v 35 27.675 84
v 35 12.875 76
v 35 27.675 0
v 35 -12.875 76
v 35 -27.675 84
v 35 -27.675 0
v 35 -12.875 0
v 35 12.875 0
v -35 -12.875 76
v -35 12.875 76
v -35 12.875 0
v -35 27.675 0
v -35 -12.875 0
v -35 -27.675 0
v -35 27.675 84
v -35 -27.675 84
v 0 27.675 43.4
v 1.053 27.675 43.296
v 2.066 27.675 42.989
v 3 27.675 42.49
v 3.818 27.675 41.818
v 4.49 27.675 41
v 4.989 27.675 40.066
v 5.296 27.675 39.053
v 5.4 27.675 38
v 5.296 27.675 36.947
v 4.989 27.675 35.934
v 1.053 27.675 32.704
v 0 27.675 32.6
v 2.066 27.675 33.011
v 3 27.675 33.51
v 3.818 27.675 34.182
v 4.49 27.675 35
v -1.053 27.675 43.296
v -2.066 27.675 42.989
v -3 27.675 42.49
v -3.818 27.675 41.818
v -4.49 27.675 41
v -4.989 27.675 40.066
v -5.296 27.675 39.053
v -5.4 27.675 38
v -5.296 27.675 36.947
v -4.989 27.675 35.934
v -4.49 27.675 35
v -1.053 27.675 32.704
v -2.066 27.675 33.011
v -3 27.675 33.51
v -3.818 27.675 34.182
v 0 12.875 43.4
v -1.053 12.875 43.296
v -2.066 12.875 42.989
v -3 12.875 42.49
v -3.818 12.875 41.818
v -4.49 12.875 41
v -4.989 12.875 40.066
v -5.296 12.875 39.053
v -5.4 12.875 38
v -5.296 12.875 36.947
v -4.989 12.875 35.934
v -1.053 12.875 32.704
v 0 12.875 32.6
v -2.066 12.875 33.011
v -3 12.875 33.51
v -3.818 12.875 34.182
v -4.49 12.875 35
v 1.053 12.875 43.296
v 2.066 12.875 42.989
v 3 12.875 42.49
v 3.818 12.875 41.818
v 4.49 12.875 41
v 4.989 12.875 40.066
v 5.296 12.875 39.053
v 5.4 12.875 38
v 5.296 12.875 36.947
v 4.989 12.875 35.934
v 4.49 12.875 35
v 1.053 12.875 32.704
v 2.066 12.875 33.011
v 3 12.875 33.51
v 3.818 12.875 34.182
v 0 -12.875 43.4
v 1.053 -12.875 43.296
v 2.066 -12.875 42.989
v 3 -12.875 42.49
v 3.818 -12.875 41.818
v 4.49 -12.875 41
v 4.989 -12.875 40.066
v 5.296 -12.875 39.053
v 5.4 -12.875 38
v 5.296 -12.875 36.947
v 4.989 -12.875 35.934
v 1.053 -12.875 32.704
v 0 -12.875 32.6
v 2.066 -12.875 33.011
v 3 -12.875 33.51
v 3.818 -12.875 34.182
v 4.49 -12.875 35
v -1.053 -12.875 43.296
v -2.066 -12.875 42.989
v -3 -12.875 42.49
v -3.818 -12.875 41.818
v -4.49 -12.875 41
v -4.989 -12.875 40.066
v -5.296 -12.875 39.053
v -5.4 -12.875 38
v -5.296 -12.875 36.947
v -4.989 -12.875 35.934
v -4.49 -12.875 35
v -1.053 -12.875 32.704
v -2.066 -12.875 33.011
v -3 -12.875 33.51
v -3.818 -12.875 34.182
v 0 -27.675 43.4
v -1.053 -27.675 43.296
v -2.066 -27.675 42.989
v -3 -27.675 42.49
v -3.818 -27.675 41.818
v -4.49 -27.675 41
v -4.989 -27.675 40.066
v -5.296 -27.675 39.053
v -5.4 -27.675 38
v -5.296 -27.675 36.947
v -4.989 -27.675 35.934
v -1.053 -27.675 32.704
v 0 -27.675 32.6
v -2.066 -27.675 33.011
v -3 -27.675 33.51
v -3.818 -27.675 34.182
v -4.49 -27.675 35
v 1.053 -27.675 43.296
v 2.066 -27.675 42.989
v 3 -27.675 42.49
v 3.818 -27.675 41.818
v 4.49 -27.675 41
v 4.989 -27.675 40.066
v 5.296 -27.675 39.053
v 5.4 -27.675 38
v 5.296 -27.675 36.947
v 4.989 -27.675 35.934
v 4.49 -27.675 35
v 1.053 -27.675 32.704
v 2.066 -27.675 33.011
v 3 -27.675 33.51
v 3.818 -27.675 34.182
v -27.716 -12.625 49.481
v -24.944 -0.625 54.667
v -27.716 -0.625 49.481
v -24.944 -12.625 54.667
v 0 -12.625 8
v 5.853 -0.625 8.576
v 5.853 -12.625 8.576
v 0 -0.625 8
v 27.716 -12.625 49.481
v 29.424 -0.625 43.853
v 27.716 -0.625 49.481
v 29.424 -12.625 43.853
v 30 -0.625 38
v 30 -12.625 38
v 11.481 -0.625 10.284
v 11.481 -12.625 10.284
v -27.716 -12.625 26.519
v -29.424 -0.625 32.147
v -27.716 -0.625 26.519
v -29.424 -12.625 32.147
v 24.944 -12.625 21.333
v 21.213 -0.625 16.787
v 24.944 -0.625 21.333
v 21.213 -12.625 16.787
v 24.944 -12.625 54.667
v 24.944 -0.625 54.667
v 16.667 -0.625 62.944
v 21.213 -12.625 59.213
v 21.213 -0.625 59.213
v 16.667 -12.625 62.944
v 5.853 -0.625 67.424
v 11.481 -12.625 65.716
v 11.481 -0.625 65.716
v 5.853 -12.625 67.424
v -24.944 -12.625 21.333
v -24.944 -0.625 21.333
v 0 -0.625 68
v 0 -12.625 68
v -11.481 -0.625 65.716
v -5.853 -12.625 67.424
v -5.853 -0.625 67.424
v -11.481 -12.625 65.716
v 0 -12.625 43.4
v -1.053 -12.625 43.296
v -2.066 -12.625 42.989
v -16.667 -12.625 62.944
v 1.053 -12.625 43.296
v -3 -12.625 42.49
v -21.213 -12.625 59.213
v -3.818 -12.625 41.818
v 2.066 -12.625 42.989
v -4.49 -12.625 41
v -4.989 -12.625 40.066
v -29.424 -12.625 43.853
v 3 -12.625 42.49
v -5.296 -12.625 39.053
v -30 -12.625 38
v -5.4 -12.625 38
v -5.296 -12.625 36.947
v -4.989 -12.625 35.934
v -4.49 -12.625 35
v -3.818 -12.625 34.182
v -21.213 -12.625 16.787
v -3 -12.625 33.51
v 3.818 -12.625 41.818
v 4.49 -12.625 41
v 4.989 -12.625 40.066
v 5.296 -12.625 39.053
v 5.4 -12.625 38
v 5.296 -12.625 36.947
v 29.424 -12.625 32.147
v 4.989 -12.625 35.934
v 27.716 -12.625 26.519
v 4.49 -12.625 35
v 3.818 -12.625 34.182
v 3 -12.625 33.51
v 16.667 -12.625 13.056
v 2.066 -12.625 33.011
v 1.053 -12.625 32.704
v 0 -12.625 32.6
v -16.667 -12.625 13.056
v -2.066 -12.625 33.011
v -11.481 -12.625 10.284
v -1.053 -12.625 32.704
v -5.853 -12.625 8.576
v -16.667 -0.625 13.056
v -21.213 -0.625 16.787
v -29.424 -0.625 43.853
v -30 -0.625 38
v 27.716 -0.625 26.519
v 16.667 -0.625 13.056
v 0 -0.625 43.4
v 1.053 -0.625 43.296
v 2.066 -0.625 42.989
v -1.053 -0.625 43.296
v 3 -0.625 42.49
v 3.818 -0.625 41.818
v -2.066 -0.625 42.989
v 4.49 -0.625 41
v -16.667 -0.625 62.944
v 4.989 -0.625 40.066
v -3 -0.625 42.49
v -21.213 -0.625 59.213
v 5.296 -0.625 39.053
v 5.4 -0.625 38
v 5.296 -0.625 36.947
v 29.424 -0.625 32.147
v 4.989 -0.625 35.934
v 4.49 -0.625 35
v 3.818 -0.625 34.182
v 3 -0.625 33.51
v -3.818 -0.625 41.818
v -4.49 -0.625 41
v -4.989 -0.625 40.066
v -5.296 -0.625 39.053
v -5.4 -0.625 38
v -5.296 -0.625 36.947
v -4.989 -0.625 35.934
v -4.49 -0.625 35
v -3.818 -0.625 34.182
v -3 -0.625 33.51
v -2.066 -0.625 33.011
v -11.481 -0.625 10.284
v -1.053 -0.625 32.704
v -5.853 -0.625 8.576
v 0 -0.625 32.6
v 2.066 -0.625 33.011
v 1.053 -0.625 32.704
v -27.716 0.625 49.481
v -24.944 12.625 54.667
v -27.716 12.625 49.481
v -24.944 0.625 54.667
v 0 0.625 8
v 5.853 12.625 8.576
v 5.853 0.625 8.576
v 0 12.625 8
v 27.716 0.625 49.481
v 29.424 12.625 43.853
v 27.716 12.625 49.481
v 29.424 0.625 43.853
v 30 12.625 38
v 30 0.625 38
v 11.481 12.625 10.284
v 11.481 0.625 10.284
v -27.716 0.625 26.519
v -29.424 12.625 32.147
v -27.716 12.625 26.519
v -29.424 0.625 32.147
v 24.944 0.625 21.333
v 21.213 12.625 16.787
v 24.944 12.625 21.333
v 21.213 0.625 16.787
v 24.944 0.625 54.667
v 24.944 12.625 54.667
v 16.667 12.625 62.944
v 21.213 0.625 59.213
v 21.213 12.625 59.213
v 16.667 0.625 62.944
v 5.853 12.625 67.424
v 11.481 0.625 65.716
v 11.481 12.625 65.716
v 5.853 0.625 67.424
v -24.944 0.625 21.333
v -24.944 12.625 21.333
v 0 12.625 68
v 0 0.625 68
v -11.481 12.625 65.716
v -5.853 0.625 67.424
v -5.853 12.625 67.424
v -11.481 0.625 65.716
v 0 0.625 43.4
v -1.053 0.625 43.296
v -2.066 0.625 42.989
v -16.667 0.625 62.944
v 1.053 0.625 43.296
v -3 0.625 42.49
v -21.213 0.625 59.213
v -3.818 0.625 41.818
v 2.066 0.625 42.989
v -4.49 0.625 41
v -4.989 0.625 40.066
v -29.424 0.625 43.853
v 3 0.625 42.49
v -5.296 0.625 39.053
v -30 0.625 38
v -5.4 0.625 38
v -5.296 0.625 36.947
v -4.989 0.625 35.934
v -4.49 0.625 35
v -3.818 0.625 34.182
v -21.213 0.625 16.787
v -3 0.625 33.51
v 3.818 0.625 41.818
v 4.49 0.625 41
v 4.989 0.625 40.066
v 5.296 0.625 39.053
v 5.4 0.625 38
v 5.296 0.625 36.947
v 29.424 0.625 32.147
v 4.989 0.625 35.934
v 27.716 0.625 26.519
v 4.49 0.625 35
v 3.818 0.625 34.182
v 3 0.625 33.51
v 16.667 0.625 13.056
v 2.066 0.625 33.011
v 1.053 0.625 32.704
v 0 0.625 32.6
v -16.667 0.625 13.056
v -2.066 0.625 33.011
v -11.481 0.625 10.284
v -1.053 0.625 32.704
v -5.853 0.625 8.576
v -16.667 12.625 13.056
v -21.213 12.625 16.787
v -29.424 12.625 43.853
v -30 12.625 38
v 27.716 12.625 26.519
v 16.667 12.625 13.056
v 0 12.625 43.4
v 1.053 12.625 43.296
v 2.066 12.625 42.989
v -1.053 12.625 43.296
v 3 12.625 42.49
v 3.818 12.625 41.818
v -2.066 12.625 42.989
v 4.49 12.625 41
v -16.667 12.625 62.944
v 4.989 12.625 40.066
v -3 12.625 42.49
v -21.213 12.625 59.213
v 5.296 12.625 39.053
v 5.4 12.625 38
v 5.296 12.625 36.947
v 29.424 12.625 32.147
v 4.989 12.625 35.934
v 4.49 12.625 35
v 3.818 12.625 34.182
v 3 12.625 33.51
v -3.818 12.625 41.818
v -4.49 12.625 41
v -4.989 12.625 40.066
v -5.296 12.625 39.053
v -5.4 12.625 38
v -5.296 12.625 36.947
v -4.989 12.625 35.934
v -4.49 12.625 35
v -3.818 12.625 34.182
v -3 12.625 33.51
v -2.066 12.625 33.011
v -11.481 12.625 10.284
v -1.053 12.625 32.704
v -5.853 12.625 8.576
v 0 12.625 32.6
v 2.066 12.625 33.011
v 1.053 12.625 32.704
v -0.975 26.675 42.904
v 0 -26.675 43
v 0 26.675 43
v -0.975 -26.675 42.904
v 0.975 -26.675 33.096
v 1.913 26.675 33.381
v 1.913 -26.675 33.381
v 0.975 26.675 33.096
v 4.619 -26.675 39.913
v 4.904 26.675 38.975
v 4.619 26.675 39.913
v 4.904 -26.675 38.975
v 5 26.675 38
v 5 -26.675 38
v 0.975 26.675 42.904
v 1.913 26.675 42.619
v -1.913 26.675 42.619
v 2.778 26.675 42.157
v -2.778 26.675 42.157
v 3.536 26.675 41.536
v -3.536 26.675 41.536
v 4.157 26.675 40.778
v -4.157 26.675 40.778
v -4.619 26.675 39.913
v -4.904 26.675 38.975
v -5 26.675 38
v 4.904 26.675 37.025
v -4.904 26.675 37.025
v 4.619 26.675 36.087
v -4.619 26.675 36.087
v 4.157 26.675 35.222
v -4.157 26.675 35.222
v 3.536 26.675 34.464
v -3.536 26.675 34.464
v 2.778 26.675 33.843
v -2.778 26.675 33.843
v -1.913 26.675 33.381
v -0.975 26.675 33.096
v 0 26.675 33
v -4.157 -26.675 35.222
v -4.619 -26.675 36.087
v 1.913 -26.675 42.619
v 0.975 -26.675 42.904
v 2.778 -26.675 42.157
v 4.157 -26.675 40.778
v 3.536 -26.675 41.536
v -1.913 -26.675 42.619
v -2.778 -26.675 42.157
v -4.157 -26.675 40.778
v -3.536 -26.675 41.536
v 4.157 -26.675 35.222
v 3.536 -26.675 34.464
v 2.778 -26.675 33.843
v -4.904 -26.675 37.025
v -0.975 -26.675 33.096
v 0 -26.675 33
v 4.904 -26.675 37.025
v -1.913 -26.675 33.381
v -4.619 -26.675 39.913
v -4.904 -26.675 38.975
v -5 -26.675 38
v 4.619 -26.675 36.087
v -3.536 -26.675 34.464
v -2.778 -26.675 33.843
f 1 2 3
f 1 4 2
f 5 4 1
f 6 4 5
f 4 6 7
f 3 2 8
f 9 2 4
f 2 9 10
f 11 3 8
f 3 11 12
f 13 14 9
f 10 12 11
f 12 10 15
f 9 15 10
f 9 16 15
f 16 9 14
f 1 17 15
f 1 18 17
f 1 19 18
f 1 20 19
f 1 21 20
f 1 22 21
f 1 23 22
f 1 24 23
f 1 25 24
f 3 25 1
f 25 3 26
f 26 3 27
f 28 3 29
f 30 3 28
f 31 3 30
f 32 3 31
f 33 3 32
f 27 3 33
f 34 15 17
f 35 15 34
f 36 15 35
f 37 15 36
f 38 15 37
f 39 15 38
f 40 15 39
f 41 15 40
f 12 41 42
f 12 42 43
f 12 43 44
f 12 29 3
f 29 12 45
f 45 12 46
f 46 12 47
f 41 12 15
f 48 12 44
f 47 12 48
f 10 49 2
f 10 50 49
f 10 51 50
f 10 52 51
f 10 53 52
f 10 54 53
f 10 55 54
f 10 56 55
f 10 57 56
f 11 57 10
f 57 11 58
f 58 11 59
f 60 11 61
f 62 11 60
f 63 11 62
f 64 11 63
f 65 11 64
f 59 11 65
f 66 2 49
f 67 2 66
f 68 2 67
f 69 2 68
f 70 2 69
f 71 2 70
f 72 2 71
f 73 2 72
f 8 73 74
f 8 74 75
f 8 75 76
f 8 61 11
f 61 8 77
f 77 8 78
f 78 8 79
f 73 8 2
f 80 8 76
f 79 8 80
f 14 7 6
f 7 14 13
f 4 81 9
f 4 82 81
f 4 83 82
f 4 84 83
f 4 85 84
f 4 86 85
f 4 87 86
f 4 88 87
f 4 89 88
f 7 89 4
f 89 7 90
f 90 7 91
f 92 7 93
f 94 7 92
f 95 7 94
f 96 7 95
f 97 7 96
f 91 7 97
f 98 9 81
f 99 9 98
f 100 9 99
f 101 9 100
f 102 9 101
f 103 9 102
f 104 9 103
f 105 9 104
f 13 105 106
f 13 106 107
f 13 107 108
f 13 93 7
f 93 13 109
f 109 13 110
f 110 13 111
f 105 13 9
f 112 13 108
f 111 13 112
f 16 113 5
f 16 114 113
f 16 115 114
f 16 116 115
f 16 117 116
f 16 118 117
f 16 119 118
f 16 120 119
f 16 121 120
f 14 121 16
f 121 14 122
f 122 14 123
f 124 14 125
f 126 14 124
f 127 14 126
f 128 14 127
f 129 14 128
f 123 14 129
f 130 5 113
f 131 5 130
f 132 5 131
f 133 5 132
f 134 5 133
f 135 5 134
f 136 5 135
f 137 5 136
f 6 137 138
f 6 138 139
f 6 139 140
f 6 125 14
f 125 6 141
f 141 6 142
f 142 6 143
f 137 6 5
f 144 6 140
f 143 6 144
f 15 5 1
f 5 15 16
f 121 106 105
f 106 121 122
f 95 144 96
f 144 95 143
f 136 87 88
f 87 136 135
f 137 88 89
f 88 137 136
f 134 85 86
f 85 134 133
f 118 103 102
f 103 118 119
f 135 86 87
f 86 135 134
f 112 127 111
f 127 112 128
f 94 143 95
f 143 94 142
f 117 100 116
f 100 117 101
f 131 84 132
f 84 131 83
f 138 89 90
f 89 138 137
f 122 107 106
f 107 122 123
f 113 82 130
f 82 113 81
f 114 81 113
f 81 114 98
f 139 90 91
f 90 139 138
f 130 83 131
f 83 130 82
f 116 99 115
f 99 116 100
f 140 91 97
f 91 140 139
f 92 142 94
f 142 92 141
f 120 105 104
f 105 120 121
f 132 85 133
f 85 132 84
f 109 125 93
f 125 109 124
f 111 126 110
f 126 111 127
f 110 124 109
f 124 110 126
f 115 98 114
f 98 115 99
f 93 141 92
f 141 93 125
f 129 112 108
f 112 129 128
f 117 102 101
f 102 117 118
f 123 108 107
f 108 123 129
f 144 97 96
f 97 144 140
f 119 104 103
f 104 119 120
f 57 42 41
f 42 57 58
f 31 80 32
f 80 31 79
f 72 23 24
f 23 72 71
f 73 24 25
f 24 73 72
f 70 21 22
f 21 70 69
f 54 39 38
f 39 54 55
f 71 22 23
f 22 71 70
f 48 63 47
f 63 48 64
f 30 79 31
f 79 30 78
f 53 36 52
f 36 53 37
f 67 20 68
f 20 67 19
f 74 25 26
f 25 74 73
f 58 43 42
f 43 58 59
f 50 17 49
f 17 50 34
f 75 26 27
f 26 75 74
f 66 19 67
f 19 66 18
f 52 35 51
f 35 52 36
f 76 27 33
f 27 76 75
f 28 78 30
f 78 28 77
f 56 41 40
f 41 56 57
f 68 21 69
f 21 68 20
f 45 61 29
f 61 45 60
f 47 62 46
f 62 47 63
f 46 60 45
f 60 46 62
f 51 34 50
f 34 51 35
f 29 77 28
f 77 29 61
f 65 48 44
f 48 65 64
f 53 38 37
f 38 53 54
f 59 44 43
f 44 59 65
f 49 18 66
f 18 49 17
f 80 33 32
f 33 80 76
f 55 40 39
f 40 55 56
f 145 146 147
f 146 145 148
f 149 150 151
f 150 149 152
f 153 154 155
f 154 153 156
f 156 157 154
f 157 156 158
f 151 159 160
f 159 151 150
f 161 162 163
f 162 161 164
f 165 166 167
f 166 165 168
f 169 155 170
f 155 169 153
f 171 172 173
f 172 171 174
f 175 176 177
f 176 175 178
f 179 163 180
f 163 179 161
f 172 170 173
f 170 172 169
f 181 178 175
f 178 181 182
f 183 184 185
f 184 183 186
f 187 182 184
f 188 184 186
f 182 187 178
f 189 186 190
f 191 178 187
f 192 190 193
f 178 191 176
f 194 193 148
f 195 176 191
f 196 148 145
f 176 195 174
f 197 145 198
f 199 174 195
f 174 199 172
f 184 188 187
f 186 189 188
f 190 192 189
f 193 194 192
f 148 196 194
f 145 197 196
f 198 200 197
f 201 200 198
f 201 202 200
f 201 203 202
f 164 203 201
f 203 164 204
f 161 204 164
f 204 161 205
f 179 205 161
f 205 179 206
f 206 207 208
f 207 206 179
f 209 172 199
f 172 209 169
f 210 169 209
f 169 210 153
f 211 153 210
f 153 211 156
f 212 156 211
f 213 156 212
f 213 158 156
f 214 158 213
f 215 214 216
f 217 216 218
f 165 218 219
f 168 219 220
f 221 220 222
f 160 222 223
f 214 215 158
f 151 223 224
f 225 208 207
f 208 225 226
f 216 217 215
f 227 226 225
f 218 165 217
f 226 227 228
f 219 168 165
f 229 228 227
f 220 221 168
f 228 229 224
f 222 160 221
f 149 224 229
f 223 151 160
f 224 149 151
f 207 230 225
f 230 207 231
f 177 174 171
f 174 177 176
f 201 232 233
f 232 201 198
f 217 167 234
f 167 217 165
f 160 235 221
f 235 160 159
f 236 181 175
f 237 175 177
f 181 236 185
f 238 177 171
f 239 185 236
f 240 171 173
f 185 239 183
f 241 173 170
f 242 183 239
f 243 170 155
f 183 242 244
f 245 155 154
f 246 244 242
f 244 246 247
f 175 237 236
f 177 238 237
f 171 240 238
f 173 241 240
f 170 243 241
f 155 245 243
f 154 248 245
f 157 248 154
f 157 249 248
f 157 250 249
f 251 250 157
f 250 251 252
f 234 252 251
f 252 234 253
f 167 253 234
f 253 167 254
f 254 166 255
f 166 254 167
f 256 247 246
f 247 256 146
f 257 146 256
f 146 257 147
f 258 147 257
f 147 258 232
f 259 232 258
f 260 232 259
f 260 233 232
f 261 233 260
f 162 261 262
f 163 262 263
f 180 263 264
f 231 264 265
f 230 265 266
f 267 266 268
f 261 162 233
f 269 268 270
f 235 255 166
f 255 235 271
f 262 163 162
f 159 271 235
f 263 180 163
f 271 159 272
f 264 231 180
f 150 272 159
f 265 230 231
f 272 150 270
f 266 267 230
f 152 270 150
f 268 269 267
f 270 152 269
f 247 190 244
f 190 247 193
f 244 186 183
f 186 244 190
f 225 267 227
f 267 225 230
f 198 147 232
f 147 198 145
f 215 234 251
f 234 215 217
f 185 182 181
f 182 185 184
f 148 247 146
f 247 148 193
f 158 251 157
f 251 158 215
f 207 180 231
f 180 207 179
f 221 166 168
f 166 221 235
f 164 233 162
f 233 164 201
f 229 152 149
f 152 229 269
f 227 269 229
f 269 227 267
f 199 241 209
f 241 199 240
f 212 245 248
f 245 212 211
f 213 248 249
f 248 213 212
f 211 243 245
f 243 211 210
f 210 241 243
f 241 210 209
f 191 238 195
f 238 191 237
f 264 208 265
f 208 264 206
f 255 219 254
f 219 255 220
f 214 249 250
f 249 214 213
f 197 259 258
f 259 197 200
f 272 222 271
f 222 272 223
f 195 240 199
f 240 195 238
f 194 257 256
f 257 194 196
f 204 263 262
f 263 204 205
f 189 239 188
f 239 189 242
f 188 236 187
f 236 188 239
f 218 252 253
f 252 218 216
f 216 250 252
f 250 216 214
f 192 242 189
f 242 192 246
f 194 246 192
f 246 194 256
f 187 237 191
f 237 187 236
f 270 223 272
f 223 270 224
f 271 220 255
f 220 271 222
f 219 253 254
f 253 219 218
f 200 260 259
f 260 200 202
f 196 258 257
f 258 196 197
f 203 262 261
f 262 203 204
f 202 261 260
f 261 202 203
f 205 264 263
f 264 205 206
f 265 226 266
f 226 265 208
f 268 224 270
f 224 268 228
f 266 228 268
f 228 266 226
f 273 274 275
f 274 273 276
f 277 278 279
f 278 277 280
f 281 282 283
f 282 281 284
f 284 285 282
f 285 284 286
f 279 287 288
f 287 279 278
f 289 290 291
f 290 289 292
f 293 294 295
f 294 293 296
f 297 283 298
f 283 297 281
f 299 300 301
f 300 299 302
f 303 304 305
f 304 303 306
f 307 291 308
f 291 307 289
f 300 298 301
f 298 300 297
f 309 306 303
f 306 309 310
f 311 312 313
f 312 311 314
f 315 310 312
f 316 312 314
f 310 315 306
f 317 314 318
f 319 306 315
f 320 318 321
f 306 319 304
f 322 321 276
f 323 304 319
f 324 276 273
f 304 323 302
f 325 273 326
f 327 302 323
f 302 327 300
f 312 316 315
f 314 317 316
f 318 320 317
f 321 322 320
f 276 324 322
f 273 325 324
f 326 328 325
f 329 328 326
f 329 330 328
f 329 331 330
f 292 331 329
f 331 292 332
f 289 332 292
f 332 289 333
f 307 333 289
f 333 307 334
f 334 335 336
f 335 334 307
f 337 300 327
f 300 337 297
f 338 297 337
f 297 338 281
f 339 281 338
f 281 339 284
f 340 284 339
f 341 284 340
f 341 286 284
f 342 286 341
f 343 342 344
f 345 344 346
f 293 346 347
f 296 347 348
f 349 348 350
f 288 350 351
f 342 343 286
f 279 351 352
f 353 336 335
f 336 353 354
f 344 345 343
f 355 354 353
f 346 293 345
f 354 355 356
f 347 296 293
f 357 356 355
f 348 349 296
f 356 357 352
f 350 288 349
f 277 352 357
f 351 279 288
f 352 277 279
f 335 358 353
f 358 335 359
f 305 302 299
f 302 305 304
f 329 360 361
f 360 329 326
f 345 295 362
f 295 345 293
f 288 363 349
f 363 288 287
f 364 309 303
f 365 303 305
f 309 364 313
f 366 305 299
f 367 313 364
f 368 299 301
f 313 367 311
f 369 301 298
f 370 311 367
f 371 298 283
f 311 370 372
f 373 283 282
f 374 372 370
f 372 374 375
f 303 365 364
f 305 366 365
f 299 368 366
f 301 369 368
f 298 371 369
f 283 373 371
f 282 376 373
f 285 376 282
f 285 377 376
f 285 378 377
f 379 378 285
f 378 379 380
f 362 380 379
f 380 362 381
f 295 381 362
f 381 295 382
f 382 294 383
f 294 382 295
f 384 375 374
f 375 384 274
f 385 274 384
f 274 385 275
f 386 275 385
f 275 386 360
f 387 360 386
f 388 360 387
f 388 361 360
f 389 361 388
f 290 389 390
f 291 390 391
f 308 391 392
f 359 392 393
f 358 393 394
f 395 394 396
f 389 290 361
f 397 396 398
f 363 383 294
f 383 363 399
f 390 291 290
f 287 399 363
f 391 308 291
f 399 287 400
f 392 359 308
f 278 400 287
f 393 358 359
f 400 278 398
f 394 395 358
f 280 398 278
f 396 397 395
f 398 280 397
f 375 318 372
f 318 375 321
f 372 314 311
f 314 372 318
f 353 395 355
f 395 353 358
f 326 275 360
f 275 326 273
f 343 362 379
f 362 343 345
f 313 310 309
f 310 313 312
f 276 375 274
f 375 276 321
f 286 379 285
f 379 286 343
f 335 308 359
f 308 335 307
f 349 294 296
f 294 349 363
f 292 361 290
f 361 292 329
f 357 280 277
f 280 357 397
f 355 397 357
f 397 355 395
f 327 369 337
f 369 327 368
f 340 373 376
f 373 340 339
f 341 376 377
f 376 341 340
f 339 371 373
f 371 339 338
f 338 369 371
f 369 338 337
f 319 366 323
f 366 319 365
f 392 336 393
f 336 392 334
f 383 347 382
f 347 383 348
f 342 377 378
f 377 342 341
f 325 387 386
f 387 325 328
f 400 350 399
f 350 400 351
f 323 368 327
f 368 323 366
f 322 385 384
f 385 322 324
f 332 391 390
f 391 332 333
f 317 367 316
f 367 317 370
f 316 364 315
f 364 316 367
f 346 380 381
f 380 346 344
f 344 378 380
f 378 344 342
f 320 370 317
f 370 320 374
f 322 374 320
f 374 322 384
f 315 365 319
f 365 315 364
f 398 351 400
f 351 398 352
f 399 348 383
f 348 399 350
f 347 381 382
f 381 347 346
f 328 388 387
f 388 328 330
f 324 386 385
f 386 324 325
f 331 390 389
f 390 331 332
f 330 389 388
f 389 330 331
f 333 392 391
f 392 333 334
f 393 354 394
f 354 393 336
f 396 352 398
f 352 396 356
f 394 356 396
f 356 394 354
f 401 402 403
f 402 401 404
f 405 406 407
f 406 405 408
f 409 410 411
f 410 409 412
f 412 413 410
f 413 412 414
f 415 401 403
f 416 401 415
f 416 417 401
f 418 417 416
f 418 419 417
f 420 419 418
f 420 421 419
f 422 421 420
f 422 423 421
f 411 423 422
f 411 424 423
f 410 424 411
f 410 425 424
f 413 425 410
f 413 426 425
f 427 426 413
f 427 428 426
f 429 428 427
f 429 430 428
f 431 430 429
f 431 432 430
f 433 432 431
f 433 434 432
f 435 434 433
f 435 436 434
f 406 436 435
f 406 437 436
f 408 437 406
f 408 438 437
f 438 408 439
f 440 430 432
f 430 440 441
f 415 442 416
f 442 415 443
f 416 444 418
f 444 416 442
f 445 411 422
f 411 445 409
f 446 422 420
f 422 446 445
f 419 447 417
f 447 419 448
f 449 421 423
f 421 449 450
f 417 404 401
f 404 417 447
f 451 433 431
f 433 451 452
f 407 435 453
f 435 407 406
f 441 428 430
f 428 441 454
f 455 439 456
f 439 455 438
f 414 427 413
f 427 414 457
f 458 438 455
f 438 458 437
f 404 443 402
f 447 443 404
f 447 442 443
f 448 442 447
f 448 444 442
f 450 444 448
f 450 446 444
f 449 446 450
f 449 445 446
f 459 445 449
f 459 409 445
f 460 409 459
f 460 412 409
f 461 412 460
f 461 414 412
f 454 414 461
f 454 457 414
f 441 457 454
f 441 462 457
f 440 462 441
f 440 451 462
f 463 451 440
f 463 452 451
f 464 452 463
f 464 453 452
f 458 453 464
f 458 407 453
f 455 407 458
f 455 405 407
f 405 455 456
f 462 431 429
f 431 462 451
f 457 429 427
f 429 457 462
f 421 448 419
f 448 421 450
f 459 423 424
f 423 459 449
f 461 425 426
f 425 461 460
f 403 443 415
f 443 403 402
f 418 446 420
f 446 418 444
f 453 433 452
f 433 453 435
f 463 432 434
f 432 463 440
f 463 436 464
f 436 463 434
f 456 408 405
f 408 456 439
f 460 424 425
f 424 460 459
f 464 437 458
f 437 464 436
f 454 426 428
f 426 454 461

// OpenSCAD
$fn = 32;

// ------------------------------------------------------------------------
// Trolley wheel set: wheels d60, fork 76 mm tall
// Every part is its own module, assembly() places every instance.
// ------------------------------------------------------------------------

// --- part 1 ---
module trolley_fork() {
  difference() {
    union() {
      translate([-35, 12.875, 0]) cube([70, 14.8, 76]);
      translate([-35, -27.675, 0]) cube([70, 14.8, 76]);
      translate([-35, -27.675, 76]) cube([70, 55.35, 8]);
    }
    translate([0, -20.275, 38]) rotate([90, 0, 0]) cylinder(h = 16.8, d = 10.8, center = true);
    translate([0, 20.275, 38]) rotate([90, 0, 0]) cylinder(h = 16.8, d = 10.8, center = true);
  }
}

// --- part 2 ---
module trolley_wheel() {
  difference() {
      translate([0, 0, 0]) cylinder(h = 12, d = 60);
      translate([0, 0, -1]) cylinder(h = 14, d = 10.8);
    }
}

// --- part 3 ---
module trolley_axle() {
  translate([0, 0, -26.675]) cylinder(h = 53.35, d = 10);
}

// --- assembly ---
module assembly() {
  color([0.80, 0.24, 0.20]) translate([0, 0, 0]) rotate([0, 0, 0]) trolley_fork();
  color([0.20, 0.45, 0.75]) translate([0, -0.625, 38]) rotate([90, 0, 0]) trolley_wheel();
  color([0.25, 0.62, 0.32]) translate([0, 12.625, 38]) rotate([90, 0, 0]) trolley_wheel();
  color([0.92, 0.70, 0.18]) translate([0, 0, 38]) rotate([90, 0, 0]) trolley_axle();
}

assembly();
